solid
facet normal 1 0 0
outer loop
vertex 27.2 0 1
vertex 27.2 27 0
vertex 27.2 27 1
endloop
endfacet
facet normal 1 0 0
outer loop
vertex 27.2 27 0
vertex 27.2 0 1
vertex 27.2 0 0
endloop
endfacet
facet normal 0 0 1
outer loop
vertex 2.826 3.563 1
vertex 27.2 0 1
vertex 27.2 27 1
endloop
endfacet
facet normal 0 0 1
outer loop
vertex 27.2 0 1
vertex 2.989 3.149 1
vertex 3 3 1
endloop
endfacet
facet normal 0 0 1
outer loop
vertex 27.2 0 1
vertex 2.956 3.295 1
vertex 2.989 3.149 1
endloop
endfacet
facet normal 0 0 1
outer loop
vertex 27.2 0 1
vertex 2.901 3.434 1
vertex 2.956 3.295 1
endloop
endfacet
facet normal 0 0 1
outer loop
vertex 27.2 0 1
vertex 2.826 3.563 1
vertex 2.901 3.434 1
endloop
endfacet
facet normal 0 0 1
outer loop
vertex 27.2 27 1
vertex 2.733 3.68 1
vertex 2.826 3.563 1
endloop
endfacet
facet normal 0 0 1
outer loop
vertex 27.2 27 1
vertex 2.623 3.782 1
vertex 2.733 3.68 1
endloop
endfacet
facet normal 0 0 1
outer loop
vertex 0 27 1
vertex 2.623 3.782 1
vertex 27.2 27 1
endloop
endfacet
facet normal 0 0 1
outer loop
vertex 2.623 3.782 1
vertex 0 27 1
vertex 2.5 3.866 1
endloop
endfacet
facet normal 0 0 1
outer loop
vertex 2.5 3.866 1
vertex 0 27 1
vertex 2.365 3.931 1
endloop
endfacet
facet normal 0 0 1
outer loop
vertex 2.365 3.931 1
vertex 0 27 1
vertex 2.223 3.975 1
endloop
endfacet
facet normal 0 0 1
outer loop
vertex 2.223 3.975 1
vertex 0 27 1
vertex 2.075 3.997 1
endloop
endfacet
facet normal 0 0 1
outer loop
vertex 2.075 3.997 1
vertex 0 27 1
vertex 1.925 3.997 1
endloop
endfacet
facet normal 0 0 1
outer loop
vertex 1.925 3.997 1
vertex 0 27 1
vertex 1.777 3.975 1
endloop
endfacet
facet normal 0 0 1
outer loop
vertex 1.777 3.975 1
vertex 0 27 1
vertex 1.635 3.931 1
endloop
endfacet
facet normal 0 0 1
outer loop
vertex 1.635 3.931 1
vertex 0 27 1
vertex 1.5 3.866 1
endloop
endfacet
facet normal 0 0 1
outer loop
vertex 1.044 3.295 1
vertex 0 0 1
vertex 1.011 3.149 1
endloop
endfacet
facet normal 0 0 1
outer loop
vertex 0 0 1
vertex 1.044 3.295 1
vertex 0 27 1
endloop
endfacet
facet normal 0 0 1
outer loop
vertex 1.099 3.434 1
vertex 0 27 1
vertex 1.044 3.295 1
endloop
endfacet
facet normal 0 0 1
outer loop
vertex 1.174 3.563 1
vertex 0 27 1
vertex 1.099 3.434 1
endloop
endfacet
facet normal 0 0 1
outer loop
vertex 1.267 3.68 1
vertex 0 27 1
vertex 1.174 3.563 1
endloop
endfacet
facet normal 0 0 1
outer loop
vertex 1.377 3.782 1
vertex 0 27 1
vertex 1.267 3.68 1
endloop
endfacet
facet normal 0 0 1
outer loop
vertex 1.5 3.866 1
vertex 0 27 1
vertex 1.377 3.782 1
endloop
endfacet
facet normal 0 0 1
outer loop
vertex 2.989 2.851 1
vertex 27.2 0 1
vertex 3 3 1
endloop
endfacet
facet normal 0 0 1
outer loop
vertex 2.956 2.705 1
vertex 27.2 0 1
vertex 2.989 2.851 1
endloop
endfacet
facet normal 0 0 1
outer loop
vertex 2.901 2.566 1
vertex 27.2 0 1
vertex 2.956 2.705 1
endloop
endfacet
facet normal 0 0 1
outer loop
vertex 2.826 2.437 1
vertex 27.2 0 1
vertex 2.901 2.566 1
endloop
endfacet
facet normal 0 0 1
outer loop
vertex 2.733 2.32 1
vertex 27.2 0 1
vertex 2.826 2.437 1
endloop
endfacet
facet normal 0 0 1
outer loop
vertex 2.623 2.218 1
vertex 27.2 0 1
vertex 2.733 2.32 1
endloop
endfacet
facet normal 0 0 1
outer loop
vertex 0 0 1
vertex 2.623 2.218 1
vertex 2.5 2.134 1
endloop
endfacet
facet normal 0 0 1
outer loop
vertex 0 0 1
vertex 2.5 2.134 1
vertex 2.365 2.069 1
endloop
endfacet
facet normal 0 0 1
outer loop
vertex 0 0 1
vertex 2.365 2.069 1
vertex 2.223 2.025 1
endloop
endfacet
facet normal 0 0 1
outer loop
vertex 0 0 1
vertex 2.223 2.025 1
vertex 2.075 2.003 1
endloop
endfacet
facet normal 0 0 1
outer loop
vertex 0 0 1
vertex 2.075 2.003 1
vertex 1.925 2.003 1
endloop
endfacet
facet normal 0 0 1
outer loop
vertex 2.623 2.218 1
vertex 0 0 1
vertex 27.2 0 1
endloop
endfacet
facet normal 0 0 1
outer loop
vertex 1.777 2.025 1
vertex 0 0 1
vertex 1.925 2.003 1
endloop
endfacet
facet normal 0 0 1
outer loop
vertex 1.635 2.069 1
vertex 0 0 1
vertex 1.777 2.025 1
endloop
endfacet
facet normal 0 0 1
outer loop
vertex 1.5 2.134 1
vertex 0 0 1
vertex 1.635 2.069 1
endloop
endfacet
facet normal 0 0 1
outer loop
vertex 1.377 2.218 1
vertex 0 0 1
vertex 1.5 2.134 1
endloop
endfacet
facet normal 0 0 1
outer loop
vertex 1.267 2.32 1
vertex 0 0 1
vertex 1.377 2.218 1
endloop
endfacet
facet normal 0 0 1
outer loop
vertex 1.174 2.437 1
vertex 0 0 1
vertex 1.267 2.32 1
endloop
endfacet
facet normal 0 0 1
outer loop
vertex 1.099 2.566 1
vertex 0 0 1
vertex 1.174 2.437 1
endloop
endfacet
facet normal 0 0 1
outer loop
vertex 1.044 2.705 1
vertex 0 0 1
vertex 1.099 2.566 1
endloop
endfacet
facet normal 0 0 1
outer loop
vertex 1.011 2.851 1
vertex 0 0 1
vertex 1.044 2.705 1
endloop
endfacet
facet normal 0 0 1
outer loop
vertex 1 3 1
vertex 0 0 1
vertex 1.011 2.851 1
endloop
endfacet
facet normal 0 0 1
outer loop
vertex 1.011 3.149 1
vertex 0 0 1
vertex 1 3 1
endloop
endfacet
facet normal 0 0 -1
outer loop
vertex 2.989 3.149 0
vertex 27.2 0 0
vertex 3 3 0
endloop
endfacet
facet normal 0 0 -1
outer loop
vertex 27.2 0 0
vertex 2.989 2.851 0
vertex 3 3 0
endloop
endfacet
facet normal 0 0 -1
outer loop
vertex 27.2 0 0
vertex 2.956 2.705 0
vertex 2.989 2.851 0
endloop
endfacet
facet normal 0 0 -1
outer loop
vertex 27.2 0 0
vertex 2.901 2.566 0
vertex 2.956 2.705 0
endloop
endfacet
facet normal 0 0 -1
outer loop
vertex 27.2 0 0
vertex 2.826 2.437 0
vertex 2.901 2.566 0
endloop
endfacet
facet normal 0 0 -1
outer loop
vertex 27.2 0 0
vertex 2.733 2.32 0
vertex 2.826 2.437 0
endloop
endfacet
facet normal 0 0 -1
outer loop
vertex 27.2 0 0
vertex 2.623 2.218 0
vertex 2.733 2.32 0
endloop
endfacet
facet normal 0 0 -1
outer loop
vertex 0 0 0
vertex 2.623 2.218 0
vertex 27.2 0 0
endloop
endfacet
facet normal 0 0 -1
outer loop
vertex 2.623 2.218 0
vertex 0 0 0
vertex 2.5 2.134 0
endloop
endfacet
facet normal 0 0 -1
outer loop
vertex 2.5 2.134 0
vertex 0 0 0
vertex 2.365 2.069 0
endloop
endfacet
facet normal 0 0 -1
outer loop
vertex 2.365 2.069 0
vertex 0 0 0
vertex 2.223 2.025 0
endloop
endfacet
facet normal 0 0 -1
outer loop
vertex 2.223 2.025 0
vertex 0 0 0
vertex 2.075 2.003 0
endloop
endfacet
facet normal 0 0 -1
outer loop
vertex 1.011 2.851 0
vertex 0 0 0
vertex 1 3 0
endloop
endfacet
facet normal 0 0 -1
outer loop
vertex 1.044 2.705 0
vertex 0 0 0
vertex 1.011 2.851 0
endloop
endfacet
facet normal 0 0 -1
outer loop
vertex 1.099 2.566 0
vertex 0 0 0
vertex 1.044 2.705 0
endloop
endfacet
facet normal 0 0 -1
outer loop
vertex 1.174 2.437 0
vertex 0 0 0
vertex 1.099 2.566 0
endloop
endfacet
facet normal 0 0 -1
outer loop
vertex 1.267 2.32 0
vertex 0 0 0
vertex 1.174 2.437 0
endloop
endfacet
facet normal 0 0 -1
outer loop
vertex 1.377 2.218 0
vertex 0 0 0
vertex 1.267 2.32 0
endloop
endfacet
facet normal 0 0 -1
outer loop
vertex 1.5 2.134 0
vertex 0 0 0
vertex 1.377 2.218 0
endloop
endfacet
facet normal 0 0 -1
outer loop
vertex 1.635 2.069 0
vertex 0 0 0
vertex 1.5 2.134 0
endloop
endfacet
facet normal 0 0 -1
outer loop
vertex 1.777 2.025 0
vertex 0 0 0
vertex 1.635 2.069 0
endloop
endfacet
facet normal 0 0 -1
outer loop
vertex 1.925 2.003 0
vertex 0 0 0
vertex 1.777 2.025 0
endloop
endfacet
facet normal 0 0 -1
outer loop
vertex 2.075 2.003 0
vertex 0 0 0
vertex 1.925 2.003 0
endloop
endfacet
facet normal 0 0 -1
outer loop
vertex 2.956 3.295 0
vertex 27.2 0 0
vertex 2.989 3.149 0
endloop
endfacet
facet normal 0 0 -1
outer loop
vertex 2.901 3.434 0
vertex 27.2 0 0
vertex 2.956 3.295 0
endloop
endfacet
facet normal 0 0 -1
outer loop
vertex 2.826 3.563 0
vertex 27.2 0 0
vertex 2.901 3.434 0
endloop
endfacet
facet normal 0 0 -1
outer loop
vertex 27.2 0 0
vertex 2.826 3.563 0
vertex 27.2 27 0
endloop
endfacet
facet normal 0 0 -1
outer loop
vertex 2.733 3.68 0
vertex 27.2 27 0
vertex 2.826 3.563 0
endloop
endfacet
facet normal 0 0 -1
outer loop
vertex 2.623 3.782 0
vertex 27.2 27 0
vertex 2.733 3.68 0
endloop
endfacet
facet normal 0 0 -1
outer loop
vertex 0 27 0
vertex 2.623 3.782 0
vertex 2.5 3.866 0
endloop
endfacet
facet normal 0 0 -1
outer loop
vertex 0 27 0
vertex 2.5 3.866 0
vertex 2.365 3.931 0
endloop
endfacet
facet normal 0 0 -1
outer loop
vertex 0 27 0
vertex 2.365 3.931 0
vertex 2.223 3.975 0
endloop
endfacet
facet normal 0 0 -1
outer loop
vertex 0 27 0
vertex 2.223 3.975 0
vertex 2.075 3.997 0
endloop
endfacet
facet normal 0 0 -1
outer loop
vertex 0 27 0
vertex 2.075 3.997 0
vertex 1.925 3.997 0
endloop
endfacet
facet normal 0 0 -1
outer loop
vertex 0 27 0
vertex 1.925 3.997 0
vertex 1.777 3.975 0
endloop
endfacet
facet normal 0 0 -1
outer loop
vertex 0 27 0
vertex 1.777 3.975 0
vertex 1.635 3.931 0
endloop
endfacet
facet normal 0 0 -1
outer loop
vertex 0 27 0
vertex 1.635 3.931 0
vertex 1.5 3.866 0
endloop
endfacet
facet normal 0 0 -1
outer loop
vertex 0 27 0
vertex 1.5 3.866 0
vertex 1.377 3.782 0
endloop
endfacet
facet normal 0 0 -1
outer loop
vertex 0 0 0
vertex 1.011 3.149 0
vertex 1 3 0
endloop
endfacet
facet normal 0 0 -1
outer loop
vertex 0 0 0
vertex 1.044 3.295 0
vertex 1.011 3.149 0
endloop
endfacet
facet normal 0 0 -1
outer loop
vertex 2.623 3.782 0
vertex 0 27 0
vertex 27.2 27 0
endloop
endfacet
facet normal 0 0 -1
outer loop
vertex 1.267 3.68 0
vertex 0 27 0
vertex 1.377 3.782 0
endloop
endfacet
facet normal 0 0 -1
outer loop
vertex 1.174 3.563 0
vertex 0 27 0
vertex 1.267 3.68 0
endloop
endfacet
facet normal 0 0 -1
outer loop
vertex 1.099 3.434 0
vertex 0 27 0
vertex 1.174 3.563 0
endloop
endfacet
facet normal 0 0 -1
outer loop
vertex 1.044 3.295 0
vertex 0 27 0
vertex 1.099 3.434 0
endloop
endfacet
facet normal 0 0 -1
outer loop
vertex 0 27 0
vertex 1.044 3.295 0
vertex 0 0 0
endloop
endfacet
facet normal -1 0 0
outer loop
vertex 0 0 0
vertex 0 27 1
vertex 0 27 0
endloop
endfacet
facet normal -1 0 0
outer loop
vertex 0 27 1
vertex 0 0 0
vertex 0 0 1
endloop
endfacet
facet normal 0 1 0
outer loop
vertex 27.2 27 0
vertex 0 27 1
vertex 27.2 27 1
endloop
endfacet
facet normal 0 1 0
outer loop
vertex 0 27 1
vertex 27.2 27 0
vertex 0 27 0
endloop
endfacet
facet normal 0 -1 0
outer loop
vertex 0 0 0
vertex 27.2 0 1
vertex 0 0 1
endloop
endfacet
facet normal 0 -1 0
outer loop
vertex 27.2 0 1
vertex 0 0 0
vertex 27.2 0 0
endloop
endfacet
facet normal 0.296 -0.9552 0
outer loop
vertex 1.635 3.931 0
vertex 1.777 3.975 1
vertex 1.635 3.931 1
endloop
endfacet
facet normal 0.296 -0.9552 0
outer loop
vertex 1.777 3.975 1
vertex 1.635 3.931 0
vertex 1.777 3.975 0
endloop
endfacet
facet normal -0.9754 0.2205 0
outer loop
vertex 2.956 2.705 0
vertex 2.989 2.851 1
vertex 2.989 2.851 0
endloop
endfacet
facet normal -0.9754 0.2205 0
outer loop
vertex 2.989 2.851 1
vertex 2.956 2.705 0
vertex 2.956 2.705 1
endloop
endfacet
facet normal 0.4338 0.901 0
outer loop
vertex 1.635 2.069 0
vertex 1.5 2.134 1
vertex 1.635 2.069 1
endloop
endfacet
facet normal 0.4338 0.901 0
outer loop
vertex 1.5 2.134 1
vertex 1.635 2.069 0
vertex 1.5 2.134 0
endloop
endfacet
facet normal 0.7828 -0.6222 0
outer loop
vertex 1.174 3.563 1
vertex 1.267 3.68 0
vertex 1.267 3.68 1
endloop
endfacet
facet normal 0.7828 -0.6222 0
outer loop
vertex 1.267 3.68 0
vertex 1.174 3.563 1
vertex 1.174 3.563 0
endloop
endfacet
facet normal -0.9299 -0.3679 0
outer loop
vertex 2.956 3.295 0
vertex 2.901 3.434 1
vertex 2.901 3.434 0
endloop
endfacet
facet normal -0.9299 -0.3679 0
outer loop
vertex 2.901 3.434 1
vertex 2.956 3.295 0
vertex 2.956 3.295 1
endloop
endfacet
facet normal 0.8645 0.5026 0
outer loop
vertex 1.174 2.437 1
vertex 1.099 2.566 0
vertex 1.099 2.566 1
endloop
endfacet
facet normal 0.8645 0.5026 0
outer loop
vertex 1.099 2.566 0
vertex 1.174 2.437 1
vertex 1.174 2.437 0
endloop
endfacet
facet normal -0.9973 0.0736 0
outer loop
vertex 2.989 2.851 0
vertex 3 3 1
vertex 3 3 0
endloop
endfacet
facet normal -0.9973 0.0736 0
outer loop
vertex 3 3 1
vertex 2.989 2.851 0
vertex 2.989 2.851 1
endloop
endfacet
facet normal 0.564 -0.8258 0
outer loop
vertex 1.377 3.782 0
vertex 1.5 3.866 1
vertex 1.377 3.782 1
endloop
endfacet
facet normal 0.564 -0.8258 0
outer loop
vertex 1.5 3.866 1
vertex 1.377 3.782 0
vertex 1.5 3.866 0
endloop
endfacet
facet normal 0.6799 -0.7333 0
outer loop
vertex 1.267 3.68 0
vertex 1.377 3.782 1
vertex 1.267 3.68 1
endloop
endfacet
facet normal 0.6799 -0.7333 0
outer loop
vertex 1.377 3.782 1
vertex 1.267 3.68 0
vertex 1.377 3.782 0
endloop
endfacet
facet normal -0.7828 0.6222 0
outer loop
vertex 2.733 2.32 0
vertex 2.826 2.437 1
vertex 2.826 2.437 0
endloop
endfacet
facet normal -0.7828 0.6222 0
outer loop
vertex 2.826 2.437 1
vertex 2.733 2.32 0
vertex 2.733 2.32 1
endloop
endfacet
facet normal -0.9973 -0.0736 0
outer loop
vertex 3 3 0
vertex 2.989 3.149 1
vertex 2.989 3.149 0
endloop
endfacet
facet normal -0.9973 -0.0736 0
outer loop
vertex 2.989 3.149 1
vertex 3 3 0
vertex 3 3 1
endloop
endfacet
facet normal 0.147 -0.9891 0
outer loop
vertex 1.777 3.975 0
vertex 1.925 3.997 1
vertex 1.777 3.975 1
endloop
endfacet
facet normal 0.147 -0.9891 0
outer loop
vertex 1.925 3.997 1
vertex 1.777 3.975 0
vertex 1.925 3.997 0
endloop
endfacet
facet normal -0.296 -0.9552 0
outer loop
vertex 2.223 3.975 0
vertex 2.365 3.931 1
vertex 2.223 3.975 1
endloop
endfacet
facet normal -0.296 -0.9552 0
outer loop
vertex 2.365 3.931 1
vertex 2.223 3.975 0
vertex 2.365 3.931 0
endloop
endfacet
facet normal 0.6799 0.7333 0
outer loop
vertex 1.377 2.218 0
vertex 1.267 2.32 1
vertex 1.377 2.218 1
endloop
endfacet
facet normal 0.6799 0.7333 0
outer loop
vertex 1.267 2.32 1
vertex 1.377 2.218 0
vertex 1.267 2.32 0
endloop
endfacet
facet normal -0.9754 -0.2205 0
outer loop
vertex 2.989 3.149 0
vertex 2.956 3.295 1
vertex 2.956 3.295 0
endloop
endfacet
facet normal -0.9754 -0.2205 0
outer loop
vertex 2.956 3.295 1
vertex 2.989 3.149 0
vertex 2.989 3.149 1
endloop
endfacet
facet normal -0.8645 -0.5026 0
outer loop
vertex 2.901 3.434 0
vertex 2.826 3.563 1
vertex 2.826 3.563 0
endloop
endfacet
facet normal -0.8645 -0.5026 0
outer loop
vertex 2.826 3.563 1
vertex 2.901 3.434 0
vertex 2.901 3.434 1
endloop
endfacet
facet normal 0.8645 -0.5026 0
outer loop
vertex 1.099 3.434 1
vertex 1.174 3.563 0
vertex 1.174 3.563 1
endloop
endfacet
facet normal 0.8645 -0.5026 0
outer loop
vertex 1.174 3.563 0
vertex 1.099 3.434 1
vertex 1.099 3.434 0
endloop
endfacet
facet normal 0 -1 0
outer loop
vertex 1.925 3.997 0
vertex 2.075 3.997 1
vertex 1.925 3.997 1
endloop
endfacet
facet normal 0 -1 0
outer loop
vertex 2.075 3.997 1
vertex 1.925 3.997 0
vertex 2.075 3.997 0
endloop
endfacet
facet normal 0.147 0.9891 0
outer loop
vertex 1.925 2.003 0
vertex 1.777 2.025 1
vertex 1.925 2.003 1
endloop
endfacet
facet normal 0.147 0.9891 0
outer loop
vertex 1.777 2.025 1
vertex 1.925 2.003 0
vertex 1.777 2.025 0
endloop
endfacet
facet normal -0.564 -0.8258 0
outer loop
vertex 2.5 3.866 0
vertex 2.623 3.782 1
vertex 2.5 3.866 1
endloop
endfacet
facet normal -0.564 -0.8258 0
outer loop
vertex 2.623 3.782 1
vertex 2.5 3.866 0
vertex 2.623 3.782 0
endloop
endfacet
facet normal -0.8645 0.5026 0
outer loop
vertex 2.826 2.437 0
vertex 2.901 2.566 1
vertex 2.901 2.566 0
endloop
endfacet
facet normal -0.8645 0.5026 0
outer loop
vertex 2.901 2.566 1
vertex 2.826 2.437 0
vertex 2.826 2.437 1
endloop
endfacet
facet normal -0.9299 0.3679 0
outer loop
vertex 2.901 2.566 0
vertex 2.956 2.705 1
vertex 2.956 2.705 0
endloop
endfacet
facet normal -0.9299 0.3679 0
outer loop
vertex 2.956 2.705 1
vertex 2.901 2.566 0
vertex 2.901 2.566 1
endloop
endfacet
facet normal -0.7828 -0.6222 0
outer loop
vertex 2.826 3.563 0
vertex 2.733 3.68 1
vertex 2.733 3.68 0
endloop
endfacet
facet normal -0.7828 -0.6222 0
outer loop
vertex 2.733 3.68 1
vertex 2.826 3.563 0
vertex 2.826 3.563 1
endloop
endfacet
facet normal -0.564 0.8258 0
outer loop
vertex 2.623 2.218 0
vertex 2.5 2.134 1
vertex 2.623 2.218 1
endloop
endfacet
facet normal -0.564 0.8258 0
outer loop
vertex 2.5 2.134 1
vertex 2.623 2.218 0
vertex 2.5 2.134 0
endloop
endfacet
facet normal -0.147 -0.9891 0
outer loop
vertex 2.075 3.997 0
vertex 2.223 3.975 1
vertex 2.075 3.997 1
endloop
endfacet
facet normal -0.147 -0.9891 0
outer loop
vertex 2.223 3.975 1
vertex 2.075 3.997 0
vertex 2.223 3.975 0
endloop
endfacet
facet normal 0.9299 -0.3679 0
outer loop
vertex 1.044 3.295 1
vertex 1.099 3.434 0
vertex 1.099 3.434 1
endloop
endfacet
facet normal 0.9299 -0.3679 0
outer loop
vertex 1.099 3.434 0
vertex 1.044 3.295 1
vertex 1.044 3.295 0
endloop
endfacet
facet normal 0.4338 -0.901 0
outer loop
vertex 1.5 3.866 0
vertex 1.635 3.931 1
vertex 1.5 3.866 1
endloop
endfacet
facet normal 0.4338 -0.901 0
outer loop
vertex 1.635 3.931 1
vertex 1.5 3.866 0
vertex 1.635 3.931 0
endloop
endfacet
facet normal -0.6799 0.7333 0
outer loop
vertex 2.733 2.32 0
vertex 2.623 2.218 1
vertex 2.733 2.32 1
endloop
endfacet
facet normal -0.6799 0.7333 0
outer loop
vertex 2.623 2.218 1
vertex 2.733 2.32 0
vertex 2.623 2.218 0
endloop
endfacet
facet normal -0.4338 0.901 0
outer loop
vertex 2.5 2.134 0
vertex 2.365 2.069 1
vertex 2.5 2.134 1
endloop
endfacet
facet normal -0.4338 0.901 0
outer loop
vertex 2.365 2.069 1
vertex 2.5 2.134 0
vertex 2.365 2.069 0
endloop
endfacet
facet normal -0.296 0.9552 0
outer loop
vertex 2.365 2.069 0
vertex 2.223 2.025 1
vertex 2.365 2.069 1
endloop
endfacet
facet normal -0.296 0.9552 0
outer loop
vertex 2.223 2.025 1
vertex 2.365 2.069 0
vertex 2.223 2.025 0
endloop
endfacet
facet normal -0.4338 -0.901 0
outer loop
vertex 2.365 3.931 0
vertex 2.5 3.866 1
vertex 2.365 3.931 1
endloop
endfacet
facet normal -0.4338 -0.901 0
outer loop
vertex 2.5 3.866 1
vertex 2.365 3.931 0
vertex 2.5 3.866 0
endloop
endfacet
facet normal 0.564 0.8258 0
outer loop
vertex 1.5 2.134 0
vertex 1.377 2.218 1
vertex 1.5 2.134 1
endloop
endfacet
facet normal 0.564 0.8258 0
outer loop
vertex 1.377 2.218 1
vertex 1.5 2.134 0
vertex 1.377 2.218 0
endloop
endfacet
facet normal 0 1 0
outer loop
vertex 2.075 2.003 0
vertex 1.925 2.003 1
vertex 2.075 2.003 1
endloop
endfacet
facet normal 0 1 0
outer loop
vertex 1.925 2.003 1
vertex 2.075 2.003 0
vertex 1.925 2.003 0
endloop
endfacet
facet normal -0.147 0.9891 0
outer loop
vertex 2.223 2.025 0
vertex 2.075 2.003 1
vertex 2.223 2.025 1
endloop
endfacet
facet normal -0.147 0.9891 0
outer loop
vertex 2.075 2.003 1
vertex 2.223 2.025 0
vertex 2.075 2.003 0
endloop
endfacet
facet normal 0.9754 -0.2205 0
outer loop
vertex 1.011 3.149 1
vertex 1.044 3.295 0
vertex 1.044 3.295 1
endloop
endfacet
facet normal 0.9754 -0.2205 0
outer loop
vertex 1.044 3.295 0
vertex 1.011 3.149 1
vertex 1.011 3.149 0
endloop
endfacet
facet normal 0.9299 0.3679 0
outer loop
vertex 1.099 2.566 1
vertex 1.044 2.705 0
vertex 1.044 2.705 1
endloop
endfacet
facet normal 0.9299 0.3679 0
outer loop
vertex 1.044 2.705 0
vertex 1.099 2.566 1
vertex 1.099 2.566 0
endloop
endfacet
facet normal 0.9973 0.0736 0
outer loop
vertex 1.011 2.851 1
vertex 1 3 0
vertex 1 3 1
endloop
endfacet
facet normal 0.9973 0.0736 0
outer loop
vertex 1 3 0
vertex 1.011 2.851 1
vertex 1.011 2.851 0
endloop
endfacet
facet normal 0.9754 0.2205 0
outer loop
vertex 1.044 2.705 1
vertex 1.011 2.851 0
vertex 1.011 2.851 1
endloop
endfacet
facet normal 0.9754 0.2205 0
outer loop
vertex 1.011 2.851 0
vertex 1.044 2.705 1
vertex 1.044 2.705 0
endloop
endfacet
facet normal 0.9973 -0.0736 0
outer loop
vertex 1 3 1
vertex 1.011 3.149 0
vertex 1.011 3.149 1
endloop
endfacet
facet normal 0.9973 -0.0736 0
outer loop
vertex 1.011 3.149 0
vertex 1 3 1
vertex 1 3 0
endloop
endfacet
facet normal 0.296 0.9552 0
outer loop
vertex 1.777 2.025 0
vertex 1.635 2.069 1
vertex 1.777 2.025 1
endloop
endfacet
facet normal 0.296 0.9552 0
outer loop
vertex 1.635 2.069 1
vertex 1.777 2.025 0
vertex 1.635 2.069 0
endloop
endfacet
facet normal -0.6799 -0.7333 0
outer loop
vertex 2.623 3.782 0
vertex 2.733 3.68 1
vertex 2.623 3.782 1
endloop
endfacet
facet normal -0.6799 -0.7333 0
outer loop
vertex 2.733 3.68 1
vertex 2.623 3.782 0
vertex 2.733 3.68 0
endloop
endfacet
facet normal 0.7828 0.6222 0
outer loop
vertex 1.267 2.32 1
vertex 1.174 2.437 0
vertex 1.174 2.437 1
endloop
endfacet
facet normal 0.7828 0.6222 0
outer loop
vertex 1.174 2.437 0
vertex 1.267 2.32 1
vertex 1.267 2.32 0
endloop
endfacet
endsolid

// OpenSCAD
$fn = 42;

difference(){
	union() {
		cube(size = [27.2000000000, 27, 1]);
		translate(v = [0, 3, 0]) {
			translate(v = [2, 0, 0]) {
				translate(v = [0, 0, -20]) {
				}
			}
		}
	}
	/* Holes Below*/
	union(){
		translate(v = [0, 3, 0]){
			translate(v = [2, 0, 0]){
				translate(v = [0, 0, -20]){
					linear_extrude(height = 50, scale = [1, 1]) {
						circle(d = 2);
					}
				}
			}
		}
	} /* End Holes */ 
}
/***********************************************
*********      SolidPython code:      **********
************************************************
 
from os.path import join
from solid.utils import *

SEGMENTS = 42
HAS_PINS = True
PINS_BACKSIDE = False


def assemble():
    print "assembling"
    base = cube([27.2, 27, 1])

    print "punching holes"
    _cylinder_hole = down(20)(hole()(linear_extrude(50, scale=[3/2, 1])(circle(d=2))))
    base += forward(3)(right(2)(_cylinder_hole))

    return base


if __name__ == '__main__':
    scad_render_to_file(assemble(), join('./out/', "heltec_oled.scad"), file_header='$fn = %s;' % SEGMENTS)
 
 
************************************************/
